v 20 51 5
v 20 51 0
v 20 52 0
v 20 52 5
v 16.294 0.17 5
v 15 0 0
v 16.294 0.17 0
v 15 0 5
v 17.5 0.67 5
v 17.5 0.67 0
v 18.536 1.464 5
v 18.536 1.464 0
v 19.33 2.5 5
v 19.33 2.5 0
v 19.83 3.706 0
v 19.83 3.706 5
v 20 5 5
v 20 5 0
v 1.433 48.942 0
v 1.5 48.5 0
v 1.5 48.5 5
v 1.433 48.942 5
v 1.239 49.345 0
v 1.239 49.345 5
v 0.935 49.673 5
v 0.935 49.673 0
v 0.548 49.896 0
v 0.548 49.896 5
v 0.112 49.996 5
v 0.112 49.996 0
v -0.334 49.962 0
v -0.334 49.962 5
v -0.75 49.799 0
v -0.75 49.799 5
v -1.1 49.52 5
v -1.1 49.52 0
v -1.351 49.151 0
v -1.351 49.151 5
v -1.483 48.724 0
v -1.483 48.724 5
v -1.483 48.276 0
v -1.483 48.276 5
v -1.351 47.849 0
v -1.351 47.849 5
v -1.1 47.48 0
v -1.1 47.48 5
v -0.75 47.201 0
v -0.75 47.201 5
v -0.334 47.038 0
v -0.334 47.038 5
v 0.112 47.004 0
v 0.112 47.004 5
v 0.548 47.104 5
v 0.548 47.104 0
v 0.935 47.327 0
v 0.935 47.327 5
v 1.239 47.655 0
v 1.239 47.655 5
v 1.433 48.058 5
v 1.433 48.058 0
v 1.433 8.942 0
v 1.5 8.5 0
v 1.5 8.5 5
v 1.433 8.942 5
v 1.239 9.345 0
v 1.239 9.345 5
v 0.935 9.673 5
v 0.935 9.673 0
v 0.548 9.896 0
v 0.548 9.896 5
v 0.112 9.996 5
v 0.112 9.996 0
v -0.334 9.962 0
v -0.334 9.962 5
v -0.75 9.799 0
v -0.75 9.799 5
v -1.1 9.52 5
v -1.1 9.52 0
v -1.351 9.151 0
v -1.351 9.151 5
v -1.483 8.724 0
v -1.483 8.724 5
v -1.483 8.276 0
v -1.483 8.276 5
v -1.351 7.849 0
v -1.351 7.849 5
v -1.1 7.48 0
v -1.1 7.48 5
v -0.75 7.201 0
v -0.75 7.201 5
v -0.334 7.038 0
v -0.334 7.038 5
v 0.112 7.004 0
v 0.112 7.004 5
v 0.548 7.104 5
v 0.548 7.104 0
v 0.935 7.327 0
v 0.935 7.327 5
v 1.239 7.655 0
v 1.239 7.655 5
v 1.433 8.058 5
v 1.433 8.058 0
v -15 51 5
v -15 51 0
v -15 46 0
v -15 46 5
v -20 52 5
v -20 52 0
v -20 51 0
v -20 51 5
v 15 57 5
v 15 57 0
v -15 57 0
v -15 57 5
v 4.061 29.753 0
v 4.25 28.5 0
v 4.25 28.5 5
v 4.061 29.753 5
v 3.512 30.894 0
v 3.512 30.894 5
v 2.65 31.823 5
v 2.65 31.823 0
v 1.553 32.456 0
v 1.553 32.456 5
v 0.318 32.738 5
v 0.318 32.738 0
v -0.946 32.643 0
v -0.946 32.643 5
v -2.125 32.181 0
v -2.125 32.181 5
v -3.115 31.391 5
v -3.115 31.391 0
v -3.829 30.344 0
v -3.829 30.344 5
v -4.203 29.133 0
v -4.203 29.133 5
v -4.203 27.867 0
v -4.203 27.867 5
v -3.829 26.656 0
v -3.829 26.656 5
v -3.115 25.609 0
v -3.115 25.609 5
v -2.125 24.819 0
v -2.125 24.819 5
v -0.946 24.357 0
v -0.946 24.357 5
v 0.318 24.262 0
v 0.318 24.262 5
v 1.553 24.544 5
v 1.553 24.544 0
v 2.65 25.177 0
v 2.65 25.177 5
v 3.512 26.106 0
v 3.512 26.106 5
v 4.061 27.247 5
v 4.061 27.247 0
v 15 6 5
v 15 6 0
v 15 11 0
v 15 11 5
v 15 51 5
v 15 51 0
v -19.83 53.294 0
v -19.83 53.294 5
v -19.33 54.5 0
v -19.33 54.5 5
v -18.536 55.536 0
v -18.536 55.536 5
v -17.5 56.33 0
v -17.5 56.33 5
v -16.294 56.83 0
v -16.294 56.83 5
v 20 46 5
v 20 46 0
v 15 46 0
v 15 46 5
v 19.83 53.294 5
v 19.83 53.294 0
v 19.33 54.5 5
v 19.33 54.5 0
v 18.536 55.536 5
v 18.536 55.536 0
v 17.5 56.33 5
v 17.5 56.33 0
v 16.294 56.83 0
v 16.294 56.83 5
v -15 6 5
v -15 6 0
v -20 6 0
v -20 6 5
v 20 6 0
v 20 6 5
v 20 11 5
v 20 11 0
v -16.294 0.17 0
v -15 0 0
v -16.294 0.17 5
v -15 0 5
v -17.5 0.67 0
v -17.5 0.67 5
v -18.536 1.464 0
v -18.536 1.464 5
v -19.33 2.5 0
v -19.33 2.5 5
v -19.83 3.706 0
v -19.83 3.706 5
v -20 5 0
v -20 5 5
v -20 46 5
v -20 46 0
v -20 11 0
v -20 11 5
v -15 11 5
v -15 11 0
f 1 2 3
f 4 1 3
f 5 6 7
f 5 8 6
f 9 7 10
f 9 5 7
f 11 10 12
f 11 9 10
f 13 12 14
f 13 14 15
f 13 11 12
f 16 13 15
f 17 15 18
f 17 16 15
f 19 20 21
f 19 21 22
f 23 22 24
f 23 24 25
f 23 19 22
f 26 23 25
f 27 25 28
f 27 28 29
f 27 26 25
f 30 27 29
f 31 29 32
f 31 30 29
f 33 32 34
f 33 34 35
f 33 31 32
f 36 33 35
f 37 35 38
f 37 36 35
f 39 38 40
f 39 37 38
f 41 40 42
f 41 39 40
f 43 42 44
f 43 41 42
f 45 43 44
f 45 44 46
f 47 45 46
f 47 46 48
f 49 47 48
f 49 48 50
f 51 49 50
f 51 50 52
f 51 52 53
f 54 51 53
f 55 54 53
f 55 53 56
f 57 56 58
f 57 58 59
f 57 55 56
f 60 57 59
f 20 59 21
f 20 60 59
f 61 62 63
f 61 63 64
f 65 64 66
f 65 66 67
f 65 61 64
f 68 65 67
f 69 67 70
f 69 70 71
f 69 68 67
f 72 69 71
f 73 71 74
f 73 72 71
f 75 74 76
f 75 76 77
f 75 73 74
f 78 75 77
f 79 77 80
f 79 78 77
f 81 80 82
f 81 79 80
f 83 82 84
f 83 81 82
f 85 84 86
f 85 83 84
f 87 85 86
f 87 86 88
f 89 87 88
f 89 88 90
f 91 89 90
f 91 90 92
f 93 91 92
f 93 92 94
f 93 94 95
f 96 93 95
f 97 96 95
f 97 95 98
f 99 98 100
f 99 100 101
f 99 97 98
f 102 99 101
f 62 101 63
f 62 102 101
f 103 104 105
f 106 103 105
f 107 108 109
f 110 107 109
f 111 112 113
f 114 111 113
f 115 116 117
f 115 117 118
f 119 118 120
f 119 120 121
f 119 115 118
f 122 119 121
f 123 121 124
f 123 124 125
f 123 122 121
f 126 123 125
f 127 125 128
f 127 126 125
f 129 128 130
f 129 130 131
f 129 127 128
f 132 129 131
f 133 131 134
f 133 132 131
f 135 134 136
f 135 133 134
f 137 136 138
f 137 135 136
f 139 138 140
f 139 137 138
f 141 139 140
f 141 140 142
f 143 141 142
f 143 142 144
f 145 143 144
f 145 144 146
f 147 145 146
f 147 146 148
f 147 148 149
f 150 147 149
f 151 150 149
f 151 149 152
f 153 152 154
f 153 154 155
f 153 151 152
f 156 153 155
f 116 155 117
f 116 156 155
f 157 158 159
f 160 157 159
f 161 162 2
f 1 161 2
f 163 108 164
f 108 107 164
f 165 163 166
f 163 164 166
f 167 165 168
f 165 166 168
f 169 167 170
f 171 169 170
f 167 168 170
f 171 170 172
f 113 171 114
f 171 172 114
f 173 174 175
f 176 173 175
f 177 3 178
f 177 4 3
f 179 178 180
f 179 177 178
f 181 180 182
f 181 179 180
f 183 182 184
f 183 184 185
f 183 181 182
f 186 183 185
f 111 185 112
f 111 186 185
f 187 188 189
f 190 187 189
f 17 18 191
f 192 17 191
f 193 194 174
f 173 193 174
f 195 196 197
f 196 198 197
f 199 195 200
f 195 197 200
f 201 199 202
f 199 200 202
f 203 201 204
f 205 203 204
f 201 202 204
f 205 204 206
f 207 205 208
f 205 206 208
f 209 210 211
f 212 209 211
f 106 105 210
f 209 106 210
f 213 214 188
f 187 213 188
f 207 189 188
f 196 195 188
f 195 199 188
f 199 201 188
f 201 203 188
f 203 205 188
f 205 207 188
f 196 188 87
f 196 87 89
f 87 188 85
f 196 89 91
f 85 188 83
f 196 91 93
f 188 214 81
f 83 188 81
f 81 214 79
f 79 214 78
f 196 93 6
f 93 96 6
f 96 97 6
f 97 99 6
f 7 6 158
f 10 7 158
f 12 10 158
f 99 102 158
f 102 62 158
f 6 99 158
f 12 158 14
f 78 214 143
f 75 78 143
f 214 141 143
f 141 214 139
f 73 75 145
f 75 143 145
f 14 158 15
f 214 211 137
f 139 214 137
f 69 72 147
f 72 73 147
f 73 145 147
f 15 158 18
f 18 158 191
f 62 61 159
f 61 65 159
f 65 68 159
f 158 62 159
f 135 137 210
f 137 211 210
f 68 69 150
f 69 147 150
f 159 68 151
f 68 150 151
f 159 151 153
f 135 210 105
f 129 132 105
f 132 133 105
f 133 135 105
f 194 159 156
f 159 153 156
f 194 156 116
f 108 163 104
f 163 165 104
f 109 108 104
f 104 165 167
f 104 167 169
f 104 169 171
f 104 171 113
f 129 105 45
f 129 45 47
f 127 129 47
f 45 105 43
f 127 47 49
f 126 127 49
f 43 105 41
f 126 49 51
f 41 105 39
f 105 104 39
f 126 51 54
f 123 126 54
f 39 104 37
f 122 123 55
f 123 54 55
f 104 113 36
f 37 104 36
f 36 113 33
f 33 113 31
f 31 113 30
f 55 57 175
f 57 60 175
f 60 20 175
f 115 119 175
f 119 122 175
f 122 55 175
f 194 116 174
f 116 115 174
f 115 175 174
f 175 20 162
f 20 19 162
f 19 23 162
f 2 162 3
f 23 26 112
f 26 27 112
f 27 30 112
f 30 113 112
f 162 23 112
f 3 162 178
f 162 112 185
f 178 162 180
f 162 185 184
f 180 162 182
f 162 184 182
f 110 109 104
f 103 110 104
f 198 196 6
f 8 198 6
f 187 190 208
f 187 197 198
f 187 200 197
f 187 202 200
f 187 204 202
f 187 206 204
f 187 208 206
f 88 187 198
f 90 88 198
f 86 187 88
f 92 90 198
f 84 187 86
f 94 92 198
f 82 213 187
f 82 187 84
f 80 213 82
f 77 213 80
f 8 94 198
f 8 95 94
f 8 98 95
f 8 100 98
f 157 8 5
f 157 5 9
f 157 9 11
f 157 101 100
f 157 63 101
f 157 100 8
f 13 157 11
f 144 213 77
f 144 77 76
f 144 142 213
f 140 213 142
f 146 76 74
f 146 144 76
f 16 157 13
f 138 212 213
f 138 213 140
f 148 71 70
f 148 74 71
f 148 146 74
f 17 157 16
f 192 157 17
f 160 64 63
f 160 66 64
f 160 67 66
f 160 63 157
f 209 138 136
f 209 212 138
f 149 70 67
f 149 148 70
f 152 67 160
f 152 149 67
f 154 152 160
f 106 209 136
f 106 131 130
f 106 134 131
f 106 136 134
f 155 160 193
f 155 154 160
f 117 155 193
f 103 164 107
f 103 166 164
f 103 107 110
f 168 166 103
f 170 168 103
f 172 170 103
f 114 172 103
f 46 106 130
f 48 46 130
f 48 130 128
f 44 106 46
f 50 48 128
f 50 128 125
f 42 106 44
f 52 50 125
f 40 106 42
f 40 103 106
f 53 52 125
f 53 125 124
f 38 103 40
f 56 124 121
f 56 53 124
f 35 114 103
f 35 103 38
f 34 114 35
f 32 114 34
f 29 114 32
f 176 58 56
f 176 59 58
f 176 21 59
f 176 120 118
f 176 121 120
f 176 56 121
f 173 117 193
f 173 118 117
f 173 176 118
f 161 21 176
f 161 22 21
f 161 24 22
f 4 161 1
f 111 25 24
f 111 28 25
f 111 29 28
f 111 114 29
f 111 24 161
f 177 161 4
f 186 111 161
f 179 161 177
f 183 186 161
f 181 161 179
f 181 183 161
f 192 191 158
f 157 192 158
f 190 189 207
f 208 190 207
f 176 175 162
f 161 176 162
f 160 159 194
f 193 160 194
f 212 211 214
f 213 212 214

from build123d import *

# Parameters (mm, degrees)
ESQUISSE1_R        = 1.5
ESQUISSE1_R_2      = 4.25
BOSS_EXTRU_1_DEPTH = 5
CONG_1_R           = 5


with BuildPart() as part:
    # Esquisse1 → Boss.-Extru.1 (new body)
    with BuildSketch(Plane.XY):
        Polygon((-20, 0), (20, 0), (20, 6), (15, 6), (15, 11), (20, 11), (20, 46), (15, 46), (15, 51), (20, 51), (20, 57), (-20, 57), (-20, 51), (-15, 51), (-15, 46), (-20, 46), (-20, 11), (-15, 11), (-15, 6), (-20, 6), align=None)
        with Locations((0, 48.5)):
            Circle(ESQUISSE1_R, mode=Mode.SUBTRACT)
        with Locations((0, 8.5)):
            Circle(ESQUISSE1_R, mode=Mode.SUBTRACT)
        with Locations((0, 28.5)):
            Circle(ESQUISSE1_R_2, mode=Mode.SUBTRACT)
    extrude(amount=BOSS_EXTRU_1_DEPTH)

    # Congé1
    cong_1_edges = [part.edges().sort_by_distance(p)[0] for p in [
        (-20, 57, 2.5),
        (20, 57, 2.5),
        (20, 0, 2.5),
        (-20, 0, 2.5),
    ]]
    fillet(cong_1_edges, radius=CONG_1_R)


solid = part.part
